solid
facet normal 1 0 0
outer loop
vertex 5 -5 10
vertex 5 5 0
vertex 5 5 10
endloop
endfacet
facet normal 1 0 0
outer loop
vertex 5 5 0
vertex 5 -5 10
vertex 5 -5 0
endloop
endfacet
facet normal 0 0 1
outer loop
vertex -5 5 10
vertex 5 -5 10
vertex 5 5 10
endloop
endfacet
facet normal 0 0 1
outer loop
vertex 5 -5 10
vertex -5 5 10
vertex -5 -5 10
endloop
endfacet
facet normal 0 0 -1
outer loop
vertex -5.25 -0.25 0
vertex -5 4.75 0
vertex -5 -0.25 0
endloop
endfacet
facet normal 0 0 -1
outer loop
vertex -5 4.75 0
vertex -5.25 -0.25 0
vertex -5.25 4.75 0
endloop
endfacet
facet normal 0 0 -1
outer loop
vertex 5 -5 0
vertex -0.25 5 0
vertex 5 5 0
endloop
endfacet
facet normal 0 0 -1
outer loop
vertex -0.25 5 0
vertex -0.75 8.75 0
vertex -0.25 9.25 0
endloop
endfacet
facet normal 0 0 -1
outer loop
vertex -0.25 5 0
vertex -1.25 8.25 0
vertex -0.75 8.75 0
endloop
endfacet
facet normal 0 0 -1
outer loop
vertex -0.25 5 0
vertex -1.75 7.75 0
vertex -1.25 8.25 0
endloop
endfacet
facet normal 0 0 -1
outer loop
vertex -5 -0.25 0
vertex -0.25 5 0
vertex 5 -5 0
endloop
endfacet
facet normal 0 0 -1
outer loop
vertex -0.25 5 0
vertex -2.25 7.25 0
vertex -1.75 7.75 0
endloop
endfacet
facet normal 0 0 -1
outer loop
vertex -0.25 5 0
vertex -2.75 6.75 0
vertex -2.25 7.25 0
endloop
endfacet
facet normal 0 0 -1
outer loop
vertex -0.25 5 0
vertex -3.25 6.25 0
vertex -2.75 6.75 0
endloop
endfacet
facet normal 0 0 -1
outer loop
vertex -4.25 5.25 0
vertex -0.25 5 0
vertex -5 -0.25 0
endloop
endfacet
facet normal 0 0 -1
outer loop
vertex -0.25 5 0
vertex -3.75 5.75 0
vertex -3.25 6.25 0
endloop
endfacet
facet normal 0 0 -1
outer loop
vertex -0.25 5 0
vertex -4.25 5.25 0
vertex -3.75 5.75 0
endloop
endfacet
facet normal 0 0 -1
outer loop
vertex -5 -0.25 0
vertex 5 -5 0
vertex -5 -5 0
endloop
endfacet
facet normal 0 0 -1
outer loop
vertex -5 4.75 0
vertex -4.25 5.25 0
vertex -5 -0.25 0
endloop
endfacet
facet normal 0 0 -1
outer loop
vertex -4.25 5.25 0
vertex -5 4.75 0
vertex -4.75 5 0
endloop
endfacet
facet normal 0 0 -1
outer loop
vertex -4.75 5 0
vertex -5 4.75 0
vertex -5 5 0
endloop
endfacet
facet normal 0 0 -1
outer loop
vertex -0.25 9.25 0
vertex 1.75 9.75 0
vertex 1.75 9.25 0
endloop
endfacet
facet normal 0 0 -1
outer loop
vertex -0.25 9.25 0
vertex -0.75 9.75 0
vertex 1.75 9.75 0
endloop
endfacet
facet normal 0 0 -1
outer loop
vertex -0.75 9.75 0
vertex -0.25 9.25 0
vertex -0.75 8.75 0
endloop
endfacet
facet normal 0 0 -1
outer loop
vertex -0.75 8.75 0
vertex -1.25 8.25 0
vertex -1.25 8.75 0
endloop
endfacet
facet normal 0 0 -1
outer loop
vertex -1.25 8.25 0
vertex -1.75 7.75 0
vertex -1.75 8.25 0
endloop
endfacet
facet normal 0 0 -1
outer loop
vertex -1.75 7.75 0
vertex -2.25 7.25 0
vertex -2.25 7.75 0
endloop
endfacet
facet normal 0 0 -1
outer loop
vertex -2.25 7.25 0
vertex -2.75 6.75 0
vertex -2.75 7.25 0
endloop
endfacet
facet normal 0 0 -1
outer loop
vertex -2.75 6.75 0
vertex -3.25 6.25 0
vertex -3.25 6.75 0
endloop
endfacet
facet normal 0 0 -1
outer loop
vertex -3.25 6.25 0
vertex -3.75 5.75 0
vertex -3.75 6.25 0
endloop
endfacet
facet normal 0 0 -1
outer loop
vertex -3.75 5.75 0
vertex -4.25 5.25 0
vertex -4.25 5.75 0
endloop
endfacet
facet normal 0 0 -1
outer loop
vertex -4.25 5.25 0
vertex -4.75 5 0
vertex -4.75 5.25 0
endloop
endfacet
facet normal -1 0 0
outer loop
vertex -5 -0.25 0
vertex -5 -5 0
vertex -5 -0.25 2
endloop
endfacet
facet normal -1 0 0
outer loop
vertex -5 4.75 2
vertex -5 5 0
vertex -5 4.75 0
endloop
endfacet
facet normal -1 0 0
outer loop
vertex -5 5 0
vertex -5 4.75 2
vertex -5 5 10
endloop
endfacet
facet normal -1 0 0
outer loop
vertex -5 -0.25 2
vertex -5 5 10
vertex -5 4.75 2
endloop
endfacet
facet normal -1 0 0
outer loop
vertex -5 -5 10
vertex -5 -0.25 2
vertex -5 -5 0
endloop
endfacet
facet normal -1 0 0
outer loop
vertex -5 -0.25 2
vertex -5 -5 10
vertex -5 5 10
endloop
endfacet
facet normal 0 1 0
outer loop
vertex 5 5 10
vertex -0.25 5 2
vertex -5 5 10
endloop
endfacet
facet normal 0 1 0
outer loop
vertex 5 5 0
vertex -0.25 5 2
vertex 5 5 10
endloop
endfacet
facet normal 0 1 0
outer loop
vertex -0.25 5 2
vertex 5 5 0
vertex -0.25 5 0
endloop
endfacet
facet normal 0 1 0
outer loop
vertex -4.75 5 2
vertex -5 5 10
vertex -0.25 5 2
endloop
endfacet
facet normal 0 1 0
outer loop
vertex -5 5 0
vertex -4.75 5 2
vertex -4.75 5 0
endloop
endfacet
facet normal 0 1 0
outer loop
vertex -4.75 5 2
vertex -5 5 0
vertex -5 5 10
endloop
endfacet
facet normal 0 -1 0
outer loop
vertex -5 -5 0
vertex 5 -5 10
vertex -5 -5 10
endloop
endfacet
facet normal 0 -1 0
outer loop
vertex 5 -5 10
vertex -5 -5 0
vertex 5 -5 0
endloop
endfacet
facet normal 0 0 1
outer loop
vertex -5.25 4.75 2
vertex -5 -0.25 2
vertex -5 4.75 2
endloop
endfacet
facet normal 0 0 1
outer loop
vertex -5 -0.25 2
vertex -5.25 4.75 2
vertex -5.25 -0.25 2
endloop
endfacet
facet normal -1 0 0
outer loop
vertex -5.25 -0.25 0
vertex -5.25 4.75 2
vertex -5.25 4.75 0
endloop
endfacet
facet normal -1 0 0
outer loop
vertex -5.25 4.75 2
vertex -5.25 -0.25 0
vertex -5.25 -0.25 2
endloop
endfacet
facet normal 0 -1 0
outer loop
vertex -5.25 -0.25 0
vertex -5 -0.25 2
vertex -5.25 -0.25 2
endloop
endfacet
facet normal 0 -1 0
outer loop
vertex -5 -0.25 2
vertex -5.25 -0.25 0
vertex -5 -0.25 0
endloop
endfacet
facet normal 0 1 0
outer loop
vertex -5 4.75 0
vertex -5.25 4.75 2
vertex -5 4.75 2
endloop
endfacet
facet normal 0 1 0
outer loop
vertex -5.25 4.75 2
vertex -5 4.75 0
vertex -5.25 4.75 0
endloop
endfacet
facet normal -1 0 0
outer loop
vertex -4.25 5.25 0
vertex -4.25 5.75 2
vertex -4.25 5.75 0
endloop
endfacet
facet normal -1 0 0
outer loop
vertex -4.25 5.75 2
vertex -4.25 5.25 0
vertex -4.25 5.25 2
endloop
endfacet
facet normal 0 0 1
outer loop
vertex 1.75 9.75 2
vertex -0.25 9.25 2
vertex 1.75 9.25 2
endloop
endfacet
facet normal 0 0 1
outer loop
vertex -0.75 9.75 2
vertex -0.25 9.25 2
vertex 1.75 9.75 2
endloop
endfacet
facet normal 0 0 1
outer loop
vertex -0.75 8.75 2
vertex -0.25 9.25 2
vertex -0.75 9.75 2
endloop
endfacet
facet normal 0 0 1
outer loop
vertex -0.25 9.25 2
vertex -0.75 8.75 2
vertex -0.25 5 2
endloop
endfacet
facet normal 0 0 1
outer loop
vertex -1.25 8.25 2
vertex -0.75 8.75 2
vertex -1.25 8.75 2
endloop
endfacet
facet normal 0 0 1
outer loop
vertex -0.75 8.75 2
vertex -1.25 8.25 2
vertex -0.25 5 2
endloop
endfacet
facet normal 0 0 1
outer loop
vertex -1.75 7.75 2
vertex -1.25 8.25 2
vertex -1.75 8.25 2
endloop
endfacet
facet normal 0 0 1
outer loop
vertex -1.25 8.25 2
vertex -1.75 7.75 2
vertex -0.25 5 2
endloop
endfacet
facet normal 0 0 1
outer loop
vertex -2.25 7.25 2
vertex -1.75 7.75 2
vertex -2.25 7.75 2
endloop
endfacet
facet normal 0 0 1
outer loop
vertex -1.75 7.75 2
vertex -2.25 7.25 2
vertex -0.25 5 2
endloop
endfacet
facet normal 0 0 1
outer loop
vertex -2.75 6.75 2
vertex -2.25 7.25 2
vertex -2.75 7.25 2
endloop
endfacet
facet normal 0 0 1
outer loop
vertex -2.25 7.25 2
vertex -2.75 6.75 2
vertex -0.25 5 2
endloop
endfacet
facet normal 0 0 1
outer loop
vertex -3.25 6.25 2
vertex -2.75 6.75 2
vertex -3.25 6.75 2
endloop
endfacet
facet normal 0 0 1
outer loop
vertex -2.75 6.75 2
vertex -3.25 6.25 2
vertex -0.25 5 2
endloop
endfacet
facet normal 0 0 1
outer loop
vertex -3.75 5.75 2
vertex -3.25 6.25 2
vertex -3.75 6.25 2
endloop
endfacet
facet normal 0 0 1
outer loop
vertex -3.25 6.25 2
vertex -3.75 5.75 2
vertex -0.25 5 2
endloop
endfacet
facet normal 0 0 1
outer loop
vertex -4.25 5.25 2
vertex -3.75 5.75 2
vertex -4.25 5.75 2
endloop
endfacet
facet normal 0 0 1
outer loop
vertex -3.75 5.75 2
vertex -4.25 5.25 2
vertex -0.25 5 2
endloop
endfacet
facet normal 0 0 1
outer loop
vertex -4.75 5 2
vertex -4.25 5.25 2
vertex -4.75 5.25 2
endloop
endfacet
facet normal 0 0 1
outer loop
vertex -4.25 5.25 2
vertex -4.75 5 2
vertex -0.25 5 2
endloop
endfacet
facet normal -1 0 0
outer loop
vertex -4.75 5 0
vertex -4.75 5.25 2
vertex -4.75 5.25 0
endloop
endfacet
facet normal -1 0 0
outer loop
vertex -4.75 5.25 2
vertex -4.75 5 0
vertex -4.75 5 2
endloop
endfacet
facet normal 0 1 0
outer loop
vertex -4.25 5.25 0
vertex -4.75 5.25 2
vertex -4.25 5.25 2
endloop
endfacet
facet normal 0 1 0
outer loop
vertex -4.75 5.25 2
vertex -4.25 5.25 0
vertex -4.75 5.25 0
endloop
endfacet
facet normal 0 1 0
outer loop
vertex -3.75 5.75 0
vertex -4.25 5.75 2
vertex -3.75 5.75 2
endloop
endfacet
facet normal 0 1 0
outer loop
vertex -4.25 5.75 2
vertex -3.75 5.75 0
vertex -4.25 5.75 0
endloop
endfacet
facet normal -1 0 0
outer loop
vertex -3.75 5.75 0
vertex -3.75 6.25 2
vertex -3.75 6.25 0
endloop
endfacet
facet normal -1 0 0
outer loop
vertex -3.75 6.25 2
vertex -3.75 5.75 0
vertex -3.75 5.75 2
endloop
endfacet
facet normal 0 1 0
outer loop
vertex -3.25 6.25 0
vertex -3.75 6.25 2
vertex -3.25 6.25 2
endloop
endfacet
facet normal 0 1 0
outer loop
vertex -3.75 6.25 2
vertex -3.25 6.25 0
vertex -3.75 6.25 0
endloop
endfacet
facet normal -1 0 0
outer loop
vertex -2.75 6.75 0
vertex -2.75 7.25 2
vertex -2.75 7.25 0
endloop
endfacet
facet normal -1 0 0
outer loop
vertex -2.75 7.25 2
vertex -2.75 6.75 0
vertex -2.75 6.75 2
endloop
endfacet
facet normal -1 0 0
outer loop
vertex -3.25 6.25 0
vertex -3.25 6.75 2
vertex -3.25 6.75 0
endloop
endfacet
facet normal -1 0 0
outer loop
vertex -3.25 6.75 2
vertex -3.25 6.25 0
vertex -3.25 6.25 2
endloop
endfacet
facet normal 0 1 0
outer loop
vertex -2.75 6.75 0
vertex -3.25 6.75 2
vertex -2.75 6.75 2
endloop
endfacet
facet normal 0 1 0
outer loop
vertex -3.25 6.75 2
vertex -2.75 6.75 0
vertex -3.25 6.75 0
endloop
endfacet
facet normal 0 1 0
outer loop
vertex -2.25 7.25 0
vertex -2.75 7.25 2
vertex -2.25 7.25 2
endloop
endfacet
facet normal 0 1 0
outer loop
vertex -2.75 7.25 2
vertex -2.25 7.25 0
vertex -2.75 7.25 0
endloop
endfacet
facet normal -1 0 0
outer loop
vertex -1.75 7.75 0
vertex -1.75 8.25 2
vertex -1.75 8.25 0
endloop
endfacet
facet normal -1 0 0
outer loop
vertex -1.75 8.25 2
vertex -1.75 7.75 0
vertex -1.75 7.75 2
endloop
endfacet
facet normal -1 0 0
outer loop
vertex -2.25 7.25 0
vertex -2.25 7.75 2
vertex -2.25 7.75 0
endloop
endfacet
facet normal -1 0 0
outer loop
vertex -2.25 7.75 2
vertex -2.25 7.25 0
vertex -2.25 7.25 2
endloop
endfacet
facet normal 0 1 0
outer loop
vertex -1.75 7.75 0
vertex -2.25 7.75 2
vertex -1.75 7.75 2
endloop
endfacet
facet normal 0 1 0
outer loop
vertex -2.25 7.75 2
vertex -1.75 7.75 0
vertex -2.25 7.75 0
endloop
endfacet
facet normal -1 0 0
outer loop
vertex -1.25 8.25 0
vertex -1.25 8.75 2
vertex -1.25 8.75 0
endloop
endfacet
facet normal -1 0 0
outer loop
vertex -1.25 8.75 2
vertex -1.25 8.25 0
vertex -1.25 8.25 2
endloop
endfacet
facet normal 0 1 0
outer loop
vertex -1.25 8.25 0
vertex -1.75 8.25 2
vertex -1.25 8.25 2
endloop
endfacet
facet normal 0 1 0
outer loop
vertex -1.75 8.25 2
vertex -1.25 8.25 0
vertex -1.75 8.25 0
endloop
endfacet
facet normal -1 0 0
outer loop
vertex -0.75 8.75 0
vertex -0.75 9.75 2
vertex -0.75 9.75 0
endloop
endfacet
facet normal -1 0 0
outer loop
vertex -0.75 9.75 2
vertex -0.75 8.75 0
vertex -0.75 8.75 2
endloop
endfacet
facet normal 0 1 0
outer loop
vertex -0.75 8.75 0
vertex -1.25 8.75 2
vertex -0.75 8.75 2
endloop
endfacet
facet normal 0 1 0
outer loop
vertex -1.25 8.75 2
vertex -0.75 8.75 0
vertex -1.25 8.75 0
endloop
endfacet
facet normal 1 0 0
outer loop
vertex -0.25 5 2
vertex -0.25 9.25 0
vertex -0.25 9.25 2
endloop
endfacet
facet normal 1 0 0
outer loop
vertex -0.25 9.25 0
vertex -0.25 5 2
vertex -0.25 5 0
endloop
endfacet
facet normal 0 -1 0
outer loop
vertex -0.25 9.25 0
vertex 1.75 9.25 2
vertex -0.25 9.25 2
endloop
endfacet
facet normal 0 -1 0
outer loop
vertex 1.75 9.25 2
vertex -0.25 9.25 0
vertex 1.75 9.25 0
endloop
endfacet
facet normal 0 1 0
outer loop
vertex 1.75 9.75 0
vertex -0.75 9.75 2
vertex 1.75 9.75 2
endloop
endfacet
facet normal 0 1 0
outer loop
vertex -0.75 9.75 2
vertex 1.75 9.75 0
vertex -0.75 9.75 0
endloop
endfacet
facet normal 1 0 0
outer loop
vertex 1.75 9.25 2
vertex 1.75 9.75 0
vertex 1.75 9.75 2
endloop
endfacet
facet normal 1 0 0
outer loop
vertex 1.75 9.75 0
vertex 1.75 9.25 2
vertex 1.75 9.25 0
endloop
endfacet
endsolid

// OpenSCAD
translate([0, 0, 5]) color([0,1,0,0.9]) cube([10, 10, 10], center=true);
translate([-5, 0, 1]) color([1,0,0]) cube([0.5, 0.5, 2], center=true);
translate([-5, 0.5, 1]) color([1,0,0]) cube([0.5, 0.5, 2], center=true);
translate([-5, 1, 1]) color([1,0,0]) cube([0.5, 0.5, 2], center=true);
translate([-5, 1.5, 1]) color([1,0,0]) cube([0.5, 0.5, 2], center=true);
translate([-5, 2, 1]) color([1,0,0]) cube([0.5, 0.5, 2], center=true);
translate([-5, 2.5, 1]) color([1,0,0]) cube([0.5, 0.5, 2], center=true);
translate([-5, 3, 1]) color([1,0,0]) cube([0.5, 0.5, 2], center=true);
translate([-5, 3.5, 1]) color([1,0,0]) cube([0.5, 0.5, 2], center=true);
translate([-5, 4, 1]) color([1,0,0]) cube([0.5, 0.5, 2], center=true);
translate([-5, 4.5, 1]) color([1,0,0]) cube([0.5, 0.5, 2], center=true);
translate([-4.5, 0, 1]) color([1,0,0]) cube([0.5, 0.5, 2], center=true);
translate([-4.5, 0.5, 1]) color([1,0,0]) cube([0.5, 0.5, 2], center=true);
translate([-4.5, 1, 1]) color([1,0,0]) cube([0.5, 0.5, 2], center=true);
translate([-4.5, 1.5, 1]) color([1,0,0]) cube([0.5, 0.5, 2], center=true);
translate([-4.5, 2, 1]) color([1,0,0]) cube([0.5, 0.5, 2], center=true);
translate([-4.5, 2.5, 1]) color([1,0,0]) cube([0.5, 0.5, 2], center=true);
translate([-4.5, 3, 1]) color([1,0,0]) cube([0.5, 0.5, 2], center=true);
translate([-4.5, 3.5, 1]) color([1,0,0]) cube([0.5, 0.5, 2], center=true);
translate([-4.5, 4, 1]) color([1,0,0]) cube([0.5, 0.5, 2], center=true);
translate([-4.5, 4.5, 1]) color([1,0,0]) cube([0.5, 0.5, 2], center=true);
translate([-4.5, 5, 1]) color([1,0,0]) cube([0.5, 0.5, 2], center=true);
translate([-4, 0, 1]) color([1,0,0]) cube([0.5, 0.5, 2], center=true);
translate([-4, 0.5, 1]) color([1,0,0]) cube([0.5, 0.5, 2], center=true);
translate([-4, 1, 1]) color([1,0,0]) cube([0.5, 0.5, 2], center=true);
translate([-4, 1.5, 1]) color([1,0,0]) cube([0.5, 0.5, 2], center=true);
translate([-4, 2, 1]) color([1,0,0]) cube([0.5, 0.5, 2], center=true);
translate([-4, 2.5, 1]) color([1,0,0]) cube([0.5, 0.5, 2], center=true);
translate([-4, 3, 1]) color([1,0,0]) cube([0.5, 0.5, 2], center=true);
translate([-4, 3.5, 1]) color([1,0,0]) cube([0.5, 0.5, 2], center=true);
translate([-4, 4, 1]) color([1,0,0]) cube([0.5, 0.5, 2], center=true);
translate([-4, 4.5, 1]) color([1,0,0]) cube([0.5, 0.5, 2], center=true);
translate([-4, 5, 1]) color([1,0,0]) cube([0.5, 0.5, 2], center=true);
translate([-4, 5.5, 1]) color([1,0,0]) cube([0.5, 0.5, 2], center=true);
translate([-3.5, 0, 1]) color([1,0,0]) cube([0.5, 0.5, 2], center=true);
translate([-3.5, 0.5, 1]) color([1,0,0]) cube([0.5, 0.5, 2], center=true);
translate([-3.5, 1, 1]) color([1,0,0]) cube([0.5, 0.5, 2], center=true);
translate([-3.5, 1.5, 1]) color([1,0,0]) cube([0.5, 0.5, 2], center=true);
translate([-3.5, 2, 1]) color([1,0,0]) cube([0.5, 0.5, 2], center=true);
translate([-3.5, 2.5, 1]) color([1,0,0]) cube([0.5, 0.5, 2], center=true);
translate([-3.5, 3, 1]) color([1,0,0]) cube([0.5, 0.5, 2], center=true);
translate([-3.5, 3.5, 1]) color([1,0,0]) cube([0.5, 0.5, 2], center=true);
translate([-3.5, 4, 1]) color([1,0,0]) cube([0.5, 0.5, 2], center=true);
translate([-3.5, 4.5, 1]) color([1,0,0]) cube([0.5, 0.5, 2], center=true);
translate([-3.5, 5, 1]) color([1,0,0]) cube([0.5, 0.5, 2], center=true);
translate([-3.5, 5.5, 1]) color([1,0,0]) cube([0.5, 0.5, 2], center=true);
translate([-3.5, 6, 1]) color([1,0,0]) cube([0.5, 0.5, 2], center=true);
translate([-3, 0, 1]) color([1,0,0]) cube([0.5, 0.5, 2], center=true);
translate([-3, 0.5, 1]) color([1,0,0]) cube([0.5, 0.5, 2], center=true);
translate([-3, 1, 1]) color([1,0,0]) cube([0.5, 0.5, 2], center=true);
translate([-3, 1.5, 1]) color([1,0,0]) cube([0.5, 0.5, 2], center=true);
translate([-3, 2, 1]) color([1,0,0]) cube([0.5, 0.5, 2], center=true);
translate([-3, 2.5, 1]) color([1,0,0]) cube([0.5, 0.5, 2], center=true);
translate([-3, 3, 1]) color([1,0,0]) cube([0.5, 0.5, 2], center=true);
translate([-3, 3.5, 1]) color([1,0,0]) cube([0.5, 0.5, 2], center=true);
translate([-3, 4, 1]) color([1,0,0]) cube([0.5, 0.5, 2], center=true);
translate([-3, 4.5, 1]) color([1,0,0]) cube([0.5, 0.5, 2], center=true);
translate([-3, 5, 1]) color([1,0,0]) cube([0.5, 0.5, 2], center=true);
translate([-3, 5.5, 1]) color([1,0,0]) cube([0.5, 0.5, 2], center=true);
translate([-3, 6, 1]) color([1,0,0]) cube([0.5, 0.5, 2], center=true);
translate([-3, 6.5, 1]) color([1,0,0]) cube([0.5, 0.5, 2], center=true);
translate([-2.5, 0, 1]) color([1,0,0]) cube([0.5, 0.5, 2], center=true);
translate([-2.5, 0.5, 1]) color([1,0,0]) cube([0.5, 0.5, 2], center=true);
translate([-2.5, 1, 1]) color([1,0,0]) cube([0.5, 0.5, 2], center=true);
translate([-2.5, 1.5, 1]) color([1,0,0]) cube([0.5, 0.5, 2], center=true);
translate([-2.5, 2, 1]) color([1,0,0]) cube([0.5, 0.5, 2], center=true);
translate([-2.5, 2.5, 1]) color([1,0,0]) cube([0.5, 0.5, 2], center=true);
translate([-2.5, 3, 1]) color([1,0,0]) cube([0.5, 0.5, 2], center=true);
translate([-2.5, 3.5, 1]) color([1,0,0]) cube([0.5, 0.5, 2], center=true);
translate([-2.5, 4, 1]) color([1,0,0]) cube([0.5, 0.5, 2], center=true);
translate([-2.5, 4.5, 1]) color([1,0,0]) cube([0.5, 0.5, 2], center=true);
translate([-2.5, 5, 1]) color([1,0,0]) cube([0.5, 0.5, 2], center=true);
translate([-2.5, 5.5, 1]) color([1,0,0]) cube([0.5, 0.5, 2], center=true);
translate([-2.5, 6, 1]) color([1,0,0]) cube([0.5, 0.5, 2], center=true);
translate([-2.5, 6.5, 1]) color([1,0,0]) cube([0.5, 0.5, 2], center=true);
translate([-2.5, 7, 1]) color([1,0,0]) cube([0.5, 0.5, 2], center=true);
translate([-2, 0, 1]) color([1,0,0]) cube([0.5, 0.5, 2], center=true);
translate([-2, 0.5, 1]) color([1,0,0]) cube([0.5, 0.5, 2], center=true);
translate([-2, 1, 1]) color([1,0,0]) cube([0.5, 0.5, 2], center=true);
translate([-2, 1.5, 1]) color([1,0,0]) cube([0.5, 0.5, 2], center=true);
translate([-2, 2, 1]) color([1,0,0]) cube([0.5, 0.5, 2], center=true);
translate([-2, 2.5, 1]) color([1,0,0]) cube([0.5, 0.5, 2], center=true);
translate([-2, 3, 1]) color([1,0,0]) cube([0.5, 0.5, 2], center=true);
translate([-2, 3.5, 1]) color([1,0,0]) cube([0.5, 0.5, 2], center=true);
translate([-2, 4, 1]) color([1,0,0]) cube([0.5, 0.5, 2], center=true);
translate([-2, 4.5, 1]) color([1,0,0]) cube([0.5, 0.5, 2], center=true);
translate([-2, 5, 1]) color([1,0,0]) cube([0.5, 0.5, 2], center=true);
translate([-2, 5.5, 1]) color([1,0,0]) cube([0.5, 0.5, 2], center=true);
translate([-2, 6, 1]) color([1,0,0]) cube([0.5, 0.5, 2], center=true);
translate([-2, 6.5, 1]) color([1,0,0]) cube([0.5, 0.5, 2], center=true);
translate([-2, 7, 1]) color([1,0,0]) cube([0.5, 0.5, 2], center=true);
translate([-2, 7.5, 1]) color([1,0,0]) cube([0.5, 0.5, 2], center=true);
translate([-1.5, 0, 1]) color([1,0,0]) cube([0.5, 0.5, 2], center=true);
translate([-1.5, 0.5, 1]) color([1,0,0]) cube([0.5, 0.5, 2], center=true);
translate([-1.5, 1, 1]) color([1,0,0]) cube([0.5, 0.5, 2], center=true);
translate([-1.5, 1.5, 1]) color([1,0,0]) cube([0.5, 0.5, 2], center=true);
translate([-1.5, 2, 1]) color([1,0,0]) cube([0.5, 0.5, 2], center=true);
translate([-1.5, 2.5, 1]) color([1,0,0]) cube([0.5, 0.5, 2], center=true);
translate([-1.5, 3, 1]) color([1,0,0]) cube([0.5, 0.5, 2], center=true);
translate([-1.5, 3.5, 1]) color([1,0,0]) cube([0.5, 0.5, 2], center=true);
translate([-1.5, 4, 1]) color([1,0,0]) cube([0.5, 0.5, 2], center=true);
translate([-1.5, 4.5, 1]) color([1,0,0]) cube([0.5, 0.5, 2], center=true);
translate([-1.5, 5, 1]) color([1,0,0]) cube([0.5, 0.5, 2], center=true);
translate([-1.5, 5.5, 1]) color([1,0,0]) cube([0.5, 0.5, 2], center=true);
translate([-1.5, 6, 1]) color([1,0,0]) cube([0.5, 0.5, 2], center=true);
translate([-1.5, 6.5, 1]) color([1,0,0]) cube([0.5, 0.5, 2], center=true);
translate([-1.5, 7, 1]) color([1,0,0]) cube([0.5, 0.5, 2], center=true);
translate([-1.5, 7.5, 1]) color([1,0,0]) cube([0.5, 0.5, 2], center=true);
translate([-1.5, 8, 1]) color([1,0,0]) cube([0.5, 0.5, 2], center=true);
translate([-1, 0, 1]) color([1,0,0]) cube([0.5, 0.5, 2], center=true);
translate([-1, 0.5, 1]) color([1,0,0]) cube([0.5, 0.5, 2], center=true);
translate([-1, 1, 1]) color([1,0,0]) cube([0.5, 0.5, 2], center=true);
translate([-1, 1.5, 1]) color([1,0,0]) cube([0.5, 0.5, 2], center=true);
translate([-1, 2, 1]) color([1,0,0]) cube([0.5, 0.5, 2], center=true);
translate([-1, 2.5, 1]) color([1,0,0]) cube([0.5, 0.5, 2], center=true);
translate([-1, 3, 1]) color([1,0,0]) cube([0.5, 0.5, 2], center=true);
translate([-1, 3.5, 1]) color([1,0,0]) cube([0.5, 0.5, 2], center=true);
translate([-1, 4, 1]) color([1,0,0]) cube([0.5, 0.5, 2], center=true);
translate([-1, 4.5, 1]) color([1,0,0]) cube([0.5, 0.5, 2], center=true);
translate([-1, 5, 1]) color([1,0,0]) cube([0.5, 0.5, 2], center=true);
translate([-1, 5.5, 1]) color([1,0,0]) cube([0.5, 0.5, 2], center=true);
translate([-1, 6, 1]) color([1,0,0]) cube([0.5, 0.5, 2], center=true);
translate([-1, 6.5, 1]) color([1,0,0]) cube([0.5, 0.5, 2], center=true);
translate([-1, 7, 1]) color([1,0,0]) cube([0.5, 0.5, 2], center=true);
translate([-1, 7.5, 1]) color([1,0,0]) cube([0.5, 0.5, 2], center=true);
translate([-1, 8, 1]) color([1,0,0]) cube([0.5, 0.5, 2], center=true);
translate([-1, 8.5, 1]) color([1,0,0]) cube([0.5, 0.5, 2], center=true);
translate([-0.5, 0, 1]) color([1,0,0]) cube([0.5, 0.5, 2], center=true);
translate([-0.5, 0.5, 1]) color([1,0,0]) cube([0.5, 0.5, 2], center=true);
translate([-0.5, 1, 1]) color([1,0,0]) cube([0.5, 0.5, 2], center=true);
translate([-0.5, 1.5, 1]) color([1,0,0]) cube([0.5, 0.5, 2], center=true);
translate([-0.5, 2, 1]) color([1,0,0]) cube([0.5, 0.5, 2], center=true);
translate([-0.5, 2.5, 1]) color([1,0,0]) cube([0.5, 0.5, 2], center=true);
translate([-0.5, 3, 1]) color([1,0,0]) cube([0.5, 0.5, 2], center=true);
translate([-0.5, 3.5, 1]) color([1,0,0]) cube([0.5, 0.5, 2], center=true);
translate([-0.5, 4, 1]) color([1,0,0]) cube([0.5, 0.5, 2], center=true);
translate([-0.5, 4.5, 1]) color([1,0,0]) cube([0.5, 0.5, 2], center=true);
translate([-0.5, 5, 1]) color([1,0,0]) cube([0.5, 0.5, 2], center=true);
translate([-0.5, 5.5, 1]) color([1,0,0]) cube([0.5, 0.5, 2], center=true);
translate([-0.5, 6, 1]) color([1,0,0]) cube([0.5, 0.5, 2], center=true);
translate([-0.5, 6.5, 1]) color([1,0,0]) cube([0.5, 0.5, 2], center=true);
translate([-0.5, 7, 1]) color([1,0,0]) cube([0.5, 0.5, 2], center=true);
translate([-0.5, 7.5, 1]) color([1,0,0]) cube([0.5, 0.5, 2], center=true);
translate([-0.5, 8, 1]) color([1,0,0]) cube([0.5, 0.5, 2], center=true);
translate([-0.5, 8.5, 1]) color([1,0,0]) cube([0.5, 0.5, 2], center=true);
translate([-0.5, 9, 1]) color([1,0,0]) cube([0.5, 0.5, 2], center=true);
translate([-0.5, 9.5, 1]) color([1,0,0]) cube([0.5, 0.5, 2], center=true);
translate([0, 9.5, 1]) color([1,0,0]) cube([0.5, 0.5, 2], center=true);
translate([0.5, 9.5, 1]) color([1,0,0]) cube([0.5, 0.5, 2], center=true);
translate([1, 9.5, 1]) color([1,0,0]) cube([0.5, 0.5, 2], center=true);
translate([1.5, 9.5, 1]) color([1,0,0]) cube([0.5, 0.5, 2], center=true);
